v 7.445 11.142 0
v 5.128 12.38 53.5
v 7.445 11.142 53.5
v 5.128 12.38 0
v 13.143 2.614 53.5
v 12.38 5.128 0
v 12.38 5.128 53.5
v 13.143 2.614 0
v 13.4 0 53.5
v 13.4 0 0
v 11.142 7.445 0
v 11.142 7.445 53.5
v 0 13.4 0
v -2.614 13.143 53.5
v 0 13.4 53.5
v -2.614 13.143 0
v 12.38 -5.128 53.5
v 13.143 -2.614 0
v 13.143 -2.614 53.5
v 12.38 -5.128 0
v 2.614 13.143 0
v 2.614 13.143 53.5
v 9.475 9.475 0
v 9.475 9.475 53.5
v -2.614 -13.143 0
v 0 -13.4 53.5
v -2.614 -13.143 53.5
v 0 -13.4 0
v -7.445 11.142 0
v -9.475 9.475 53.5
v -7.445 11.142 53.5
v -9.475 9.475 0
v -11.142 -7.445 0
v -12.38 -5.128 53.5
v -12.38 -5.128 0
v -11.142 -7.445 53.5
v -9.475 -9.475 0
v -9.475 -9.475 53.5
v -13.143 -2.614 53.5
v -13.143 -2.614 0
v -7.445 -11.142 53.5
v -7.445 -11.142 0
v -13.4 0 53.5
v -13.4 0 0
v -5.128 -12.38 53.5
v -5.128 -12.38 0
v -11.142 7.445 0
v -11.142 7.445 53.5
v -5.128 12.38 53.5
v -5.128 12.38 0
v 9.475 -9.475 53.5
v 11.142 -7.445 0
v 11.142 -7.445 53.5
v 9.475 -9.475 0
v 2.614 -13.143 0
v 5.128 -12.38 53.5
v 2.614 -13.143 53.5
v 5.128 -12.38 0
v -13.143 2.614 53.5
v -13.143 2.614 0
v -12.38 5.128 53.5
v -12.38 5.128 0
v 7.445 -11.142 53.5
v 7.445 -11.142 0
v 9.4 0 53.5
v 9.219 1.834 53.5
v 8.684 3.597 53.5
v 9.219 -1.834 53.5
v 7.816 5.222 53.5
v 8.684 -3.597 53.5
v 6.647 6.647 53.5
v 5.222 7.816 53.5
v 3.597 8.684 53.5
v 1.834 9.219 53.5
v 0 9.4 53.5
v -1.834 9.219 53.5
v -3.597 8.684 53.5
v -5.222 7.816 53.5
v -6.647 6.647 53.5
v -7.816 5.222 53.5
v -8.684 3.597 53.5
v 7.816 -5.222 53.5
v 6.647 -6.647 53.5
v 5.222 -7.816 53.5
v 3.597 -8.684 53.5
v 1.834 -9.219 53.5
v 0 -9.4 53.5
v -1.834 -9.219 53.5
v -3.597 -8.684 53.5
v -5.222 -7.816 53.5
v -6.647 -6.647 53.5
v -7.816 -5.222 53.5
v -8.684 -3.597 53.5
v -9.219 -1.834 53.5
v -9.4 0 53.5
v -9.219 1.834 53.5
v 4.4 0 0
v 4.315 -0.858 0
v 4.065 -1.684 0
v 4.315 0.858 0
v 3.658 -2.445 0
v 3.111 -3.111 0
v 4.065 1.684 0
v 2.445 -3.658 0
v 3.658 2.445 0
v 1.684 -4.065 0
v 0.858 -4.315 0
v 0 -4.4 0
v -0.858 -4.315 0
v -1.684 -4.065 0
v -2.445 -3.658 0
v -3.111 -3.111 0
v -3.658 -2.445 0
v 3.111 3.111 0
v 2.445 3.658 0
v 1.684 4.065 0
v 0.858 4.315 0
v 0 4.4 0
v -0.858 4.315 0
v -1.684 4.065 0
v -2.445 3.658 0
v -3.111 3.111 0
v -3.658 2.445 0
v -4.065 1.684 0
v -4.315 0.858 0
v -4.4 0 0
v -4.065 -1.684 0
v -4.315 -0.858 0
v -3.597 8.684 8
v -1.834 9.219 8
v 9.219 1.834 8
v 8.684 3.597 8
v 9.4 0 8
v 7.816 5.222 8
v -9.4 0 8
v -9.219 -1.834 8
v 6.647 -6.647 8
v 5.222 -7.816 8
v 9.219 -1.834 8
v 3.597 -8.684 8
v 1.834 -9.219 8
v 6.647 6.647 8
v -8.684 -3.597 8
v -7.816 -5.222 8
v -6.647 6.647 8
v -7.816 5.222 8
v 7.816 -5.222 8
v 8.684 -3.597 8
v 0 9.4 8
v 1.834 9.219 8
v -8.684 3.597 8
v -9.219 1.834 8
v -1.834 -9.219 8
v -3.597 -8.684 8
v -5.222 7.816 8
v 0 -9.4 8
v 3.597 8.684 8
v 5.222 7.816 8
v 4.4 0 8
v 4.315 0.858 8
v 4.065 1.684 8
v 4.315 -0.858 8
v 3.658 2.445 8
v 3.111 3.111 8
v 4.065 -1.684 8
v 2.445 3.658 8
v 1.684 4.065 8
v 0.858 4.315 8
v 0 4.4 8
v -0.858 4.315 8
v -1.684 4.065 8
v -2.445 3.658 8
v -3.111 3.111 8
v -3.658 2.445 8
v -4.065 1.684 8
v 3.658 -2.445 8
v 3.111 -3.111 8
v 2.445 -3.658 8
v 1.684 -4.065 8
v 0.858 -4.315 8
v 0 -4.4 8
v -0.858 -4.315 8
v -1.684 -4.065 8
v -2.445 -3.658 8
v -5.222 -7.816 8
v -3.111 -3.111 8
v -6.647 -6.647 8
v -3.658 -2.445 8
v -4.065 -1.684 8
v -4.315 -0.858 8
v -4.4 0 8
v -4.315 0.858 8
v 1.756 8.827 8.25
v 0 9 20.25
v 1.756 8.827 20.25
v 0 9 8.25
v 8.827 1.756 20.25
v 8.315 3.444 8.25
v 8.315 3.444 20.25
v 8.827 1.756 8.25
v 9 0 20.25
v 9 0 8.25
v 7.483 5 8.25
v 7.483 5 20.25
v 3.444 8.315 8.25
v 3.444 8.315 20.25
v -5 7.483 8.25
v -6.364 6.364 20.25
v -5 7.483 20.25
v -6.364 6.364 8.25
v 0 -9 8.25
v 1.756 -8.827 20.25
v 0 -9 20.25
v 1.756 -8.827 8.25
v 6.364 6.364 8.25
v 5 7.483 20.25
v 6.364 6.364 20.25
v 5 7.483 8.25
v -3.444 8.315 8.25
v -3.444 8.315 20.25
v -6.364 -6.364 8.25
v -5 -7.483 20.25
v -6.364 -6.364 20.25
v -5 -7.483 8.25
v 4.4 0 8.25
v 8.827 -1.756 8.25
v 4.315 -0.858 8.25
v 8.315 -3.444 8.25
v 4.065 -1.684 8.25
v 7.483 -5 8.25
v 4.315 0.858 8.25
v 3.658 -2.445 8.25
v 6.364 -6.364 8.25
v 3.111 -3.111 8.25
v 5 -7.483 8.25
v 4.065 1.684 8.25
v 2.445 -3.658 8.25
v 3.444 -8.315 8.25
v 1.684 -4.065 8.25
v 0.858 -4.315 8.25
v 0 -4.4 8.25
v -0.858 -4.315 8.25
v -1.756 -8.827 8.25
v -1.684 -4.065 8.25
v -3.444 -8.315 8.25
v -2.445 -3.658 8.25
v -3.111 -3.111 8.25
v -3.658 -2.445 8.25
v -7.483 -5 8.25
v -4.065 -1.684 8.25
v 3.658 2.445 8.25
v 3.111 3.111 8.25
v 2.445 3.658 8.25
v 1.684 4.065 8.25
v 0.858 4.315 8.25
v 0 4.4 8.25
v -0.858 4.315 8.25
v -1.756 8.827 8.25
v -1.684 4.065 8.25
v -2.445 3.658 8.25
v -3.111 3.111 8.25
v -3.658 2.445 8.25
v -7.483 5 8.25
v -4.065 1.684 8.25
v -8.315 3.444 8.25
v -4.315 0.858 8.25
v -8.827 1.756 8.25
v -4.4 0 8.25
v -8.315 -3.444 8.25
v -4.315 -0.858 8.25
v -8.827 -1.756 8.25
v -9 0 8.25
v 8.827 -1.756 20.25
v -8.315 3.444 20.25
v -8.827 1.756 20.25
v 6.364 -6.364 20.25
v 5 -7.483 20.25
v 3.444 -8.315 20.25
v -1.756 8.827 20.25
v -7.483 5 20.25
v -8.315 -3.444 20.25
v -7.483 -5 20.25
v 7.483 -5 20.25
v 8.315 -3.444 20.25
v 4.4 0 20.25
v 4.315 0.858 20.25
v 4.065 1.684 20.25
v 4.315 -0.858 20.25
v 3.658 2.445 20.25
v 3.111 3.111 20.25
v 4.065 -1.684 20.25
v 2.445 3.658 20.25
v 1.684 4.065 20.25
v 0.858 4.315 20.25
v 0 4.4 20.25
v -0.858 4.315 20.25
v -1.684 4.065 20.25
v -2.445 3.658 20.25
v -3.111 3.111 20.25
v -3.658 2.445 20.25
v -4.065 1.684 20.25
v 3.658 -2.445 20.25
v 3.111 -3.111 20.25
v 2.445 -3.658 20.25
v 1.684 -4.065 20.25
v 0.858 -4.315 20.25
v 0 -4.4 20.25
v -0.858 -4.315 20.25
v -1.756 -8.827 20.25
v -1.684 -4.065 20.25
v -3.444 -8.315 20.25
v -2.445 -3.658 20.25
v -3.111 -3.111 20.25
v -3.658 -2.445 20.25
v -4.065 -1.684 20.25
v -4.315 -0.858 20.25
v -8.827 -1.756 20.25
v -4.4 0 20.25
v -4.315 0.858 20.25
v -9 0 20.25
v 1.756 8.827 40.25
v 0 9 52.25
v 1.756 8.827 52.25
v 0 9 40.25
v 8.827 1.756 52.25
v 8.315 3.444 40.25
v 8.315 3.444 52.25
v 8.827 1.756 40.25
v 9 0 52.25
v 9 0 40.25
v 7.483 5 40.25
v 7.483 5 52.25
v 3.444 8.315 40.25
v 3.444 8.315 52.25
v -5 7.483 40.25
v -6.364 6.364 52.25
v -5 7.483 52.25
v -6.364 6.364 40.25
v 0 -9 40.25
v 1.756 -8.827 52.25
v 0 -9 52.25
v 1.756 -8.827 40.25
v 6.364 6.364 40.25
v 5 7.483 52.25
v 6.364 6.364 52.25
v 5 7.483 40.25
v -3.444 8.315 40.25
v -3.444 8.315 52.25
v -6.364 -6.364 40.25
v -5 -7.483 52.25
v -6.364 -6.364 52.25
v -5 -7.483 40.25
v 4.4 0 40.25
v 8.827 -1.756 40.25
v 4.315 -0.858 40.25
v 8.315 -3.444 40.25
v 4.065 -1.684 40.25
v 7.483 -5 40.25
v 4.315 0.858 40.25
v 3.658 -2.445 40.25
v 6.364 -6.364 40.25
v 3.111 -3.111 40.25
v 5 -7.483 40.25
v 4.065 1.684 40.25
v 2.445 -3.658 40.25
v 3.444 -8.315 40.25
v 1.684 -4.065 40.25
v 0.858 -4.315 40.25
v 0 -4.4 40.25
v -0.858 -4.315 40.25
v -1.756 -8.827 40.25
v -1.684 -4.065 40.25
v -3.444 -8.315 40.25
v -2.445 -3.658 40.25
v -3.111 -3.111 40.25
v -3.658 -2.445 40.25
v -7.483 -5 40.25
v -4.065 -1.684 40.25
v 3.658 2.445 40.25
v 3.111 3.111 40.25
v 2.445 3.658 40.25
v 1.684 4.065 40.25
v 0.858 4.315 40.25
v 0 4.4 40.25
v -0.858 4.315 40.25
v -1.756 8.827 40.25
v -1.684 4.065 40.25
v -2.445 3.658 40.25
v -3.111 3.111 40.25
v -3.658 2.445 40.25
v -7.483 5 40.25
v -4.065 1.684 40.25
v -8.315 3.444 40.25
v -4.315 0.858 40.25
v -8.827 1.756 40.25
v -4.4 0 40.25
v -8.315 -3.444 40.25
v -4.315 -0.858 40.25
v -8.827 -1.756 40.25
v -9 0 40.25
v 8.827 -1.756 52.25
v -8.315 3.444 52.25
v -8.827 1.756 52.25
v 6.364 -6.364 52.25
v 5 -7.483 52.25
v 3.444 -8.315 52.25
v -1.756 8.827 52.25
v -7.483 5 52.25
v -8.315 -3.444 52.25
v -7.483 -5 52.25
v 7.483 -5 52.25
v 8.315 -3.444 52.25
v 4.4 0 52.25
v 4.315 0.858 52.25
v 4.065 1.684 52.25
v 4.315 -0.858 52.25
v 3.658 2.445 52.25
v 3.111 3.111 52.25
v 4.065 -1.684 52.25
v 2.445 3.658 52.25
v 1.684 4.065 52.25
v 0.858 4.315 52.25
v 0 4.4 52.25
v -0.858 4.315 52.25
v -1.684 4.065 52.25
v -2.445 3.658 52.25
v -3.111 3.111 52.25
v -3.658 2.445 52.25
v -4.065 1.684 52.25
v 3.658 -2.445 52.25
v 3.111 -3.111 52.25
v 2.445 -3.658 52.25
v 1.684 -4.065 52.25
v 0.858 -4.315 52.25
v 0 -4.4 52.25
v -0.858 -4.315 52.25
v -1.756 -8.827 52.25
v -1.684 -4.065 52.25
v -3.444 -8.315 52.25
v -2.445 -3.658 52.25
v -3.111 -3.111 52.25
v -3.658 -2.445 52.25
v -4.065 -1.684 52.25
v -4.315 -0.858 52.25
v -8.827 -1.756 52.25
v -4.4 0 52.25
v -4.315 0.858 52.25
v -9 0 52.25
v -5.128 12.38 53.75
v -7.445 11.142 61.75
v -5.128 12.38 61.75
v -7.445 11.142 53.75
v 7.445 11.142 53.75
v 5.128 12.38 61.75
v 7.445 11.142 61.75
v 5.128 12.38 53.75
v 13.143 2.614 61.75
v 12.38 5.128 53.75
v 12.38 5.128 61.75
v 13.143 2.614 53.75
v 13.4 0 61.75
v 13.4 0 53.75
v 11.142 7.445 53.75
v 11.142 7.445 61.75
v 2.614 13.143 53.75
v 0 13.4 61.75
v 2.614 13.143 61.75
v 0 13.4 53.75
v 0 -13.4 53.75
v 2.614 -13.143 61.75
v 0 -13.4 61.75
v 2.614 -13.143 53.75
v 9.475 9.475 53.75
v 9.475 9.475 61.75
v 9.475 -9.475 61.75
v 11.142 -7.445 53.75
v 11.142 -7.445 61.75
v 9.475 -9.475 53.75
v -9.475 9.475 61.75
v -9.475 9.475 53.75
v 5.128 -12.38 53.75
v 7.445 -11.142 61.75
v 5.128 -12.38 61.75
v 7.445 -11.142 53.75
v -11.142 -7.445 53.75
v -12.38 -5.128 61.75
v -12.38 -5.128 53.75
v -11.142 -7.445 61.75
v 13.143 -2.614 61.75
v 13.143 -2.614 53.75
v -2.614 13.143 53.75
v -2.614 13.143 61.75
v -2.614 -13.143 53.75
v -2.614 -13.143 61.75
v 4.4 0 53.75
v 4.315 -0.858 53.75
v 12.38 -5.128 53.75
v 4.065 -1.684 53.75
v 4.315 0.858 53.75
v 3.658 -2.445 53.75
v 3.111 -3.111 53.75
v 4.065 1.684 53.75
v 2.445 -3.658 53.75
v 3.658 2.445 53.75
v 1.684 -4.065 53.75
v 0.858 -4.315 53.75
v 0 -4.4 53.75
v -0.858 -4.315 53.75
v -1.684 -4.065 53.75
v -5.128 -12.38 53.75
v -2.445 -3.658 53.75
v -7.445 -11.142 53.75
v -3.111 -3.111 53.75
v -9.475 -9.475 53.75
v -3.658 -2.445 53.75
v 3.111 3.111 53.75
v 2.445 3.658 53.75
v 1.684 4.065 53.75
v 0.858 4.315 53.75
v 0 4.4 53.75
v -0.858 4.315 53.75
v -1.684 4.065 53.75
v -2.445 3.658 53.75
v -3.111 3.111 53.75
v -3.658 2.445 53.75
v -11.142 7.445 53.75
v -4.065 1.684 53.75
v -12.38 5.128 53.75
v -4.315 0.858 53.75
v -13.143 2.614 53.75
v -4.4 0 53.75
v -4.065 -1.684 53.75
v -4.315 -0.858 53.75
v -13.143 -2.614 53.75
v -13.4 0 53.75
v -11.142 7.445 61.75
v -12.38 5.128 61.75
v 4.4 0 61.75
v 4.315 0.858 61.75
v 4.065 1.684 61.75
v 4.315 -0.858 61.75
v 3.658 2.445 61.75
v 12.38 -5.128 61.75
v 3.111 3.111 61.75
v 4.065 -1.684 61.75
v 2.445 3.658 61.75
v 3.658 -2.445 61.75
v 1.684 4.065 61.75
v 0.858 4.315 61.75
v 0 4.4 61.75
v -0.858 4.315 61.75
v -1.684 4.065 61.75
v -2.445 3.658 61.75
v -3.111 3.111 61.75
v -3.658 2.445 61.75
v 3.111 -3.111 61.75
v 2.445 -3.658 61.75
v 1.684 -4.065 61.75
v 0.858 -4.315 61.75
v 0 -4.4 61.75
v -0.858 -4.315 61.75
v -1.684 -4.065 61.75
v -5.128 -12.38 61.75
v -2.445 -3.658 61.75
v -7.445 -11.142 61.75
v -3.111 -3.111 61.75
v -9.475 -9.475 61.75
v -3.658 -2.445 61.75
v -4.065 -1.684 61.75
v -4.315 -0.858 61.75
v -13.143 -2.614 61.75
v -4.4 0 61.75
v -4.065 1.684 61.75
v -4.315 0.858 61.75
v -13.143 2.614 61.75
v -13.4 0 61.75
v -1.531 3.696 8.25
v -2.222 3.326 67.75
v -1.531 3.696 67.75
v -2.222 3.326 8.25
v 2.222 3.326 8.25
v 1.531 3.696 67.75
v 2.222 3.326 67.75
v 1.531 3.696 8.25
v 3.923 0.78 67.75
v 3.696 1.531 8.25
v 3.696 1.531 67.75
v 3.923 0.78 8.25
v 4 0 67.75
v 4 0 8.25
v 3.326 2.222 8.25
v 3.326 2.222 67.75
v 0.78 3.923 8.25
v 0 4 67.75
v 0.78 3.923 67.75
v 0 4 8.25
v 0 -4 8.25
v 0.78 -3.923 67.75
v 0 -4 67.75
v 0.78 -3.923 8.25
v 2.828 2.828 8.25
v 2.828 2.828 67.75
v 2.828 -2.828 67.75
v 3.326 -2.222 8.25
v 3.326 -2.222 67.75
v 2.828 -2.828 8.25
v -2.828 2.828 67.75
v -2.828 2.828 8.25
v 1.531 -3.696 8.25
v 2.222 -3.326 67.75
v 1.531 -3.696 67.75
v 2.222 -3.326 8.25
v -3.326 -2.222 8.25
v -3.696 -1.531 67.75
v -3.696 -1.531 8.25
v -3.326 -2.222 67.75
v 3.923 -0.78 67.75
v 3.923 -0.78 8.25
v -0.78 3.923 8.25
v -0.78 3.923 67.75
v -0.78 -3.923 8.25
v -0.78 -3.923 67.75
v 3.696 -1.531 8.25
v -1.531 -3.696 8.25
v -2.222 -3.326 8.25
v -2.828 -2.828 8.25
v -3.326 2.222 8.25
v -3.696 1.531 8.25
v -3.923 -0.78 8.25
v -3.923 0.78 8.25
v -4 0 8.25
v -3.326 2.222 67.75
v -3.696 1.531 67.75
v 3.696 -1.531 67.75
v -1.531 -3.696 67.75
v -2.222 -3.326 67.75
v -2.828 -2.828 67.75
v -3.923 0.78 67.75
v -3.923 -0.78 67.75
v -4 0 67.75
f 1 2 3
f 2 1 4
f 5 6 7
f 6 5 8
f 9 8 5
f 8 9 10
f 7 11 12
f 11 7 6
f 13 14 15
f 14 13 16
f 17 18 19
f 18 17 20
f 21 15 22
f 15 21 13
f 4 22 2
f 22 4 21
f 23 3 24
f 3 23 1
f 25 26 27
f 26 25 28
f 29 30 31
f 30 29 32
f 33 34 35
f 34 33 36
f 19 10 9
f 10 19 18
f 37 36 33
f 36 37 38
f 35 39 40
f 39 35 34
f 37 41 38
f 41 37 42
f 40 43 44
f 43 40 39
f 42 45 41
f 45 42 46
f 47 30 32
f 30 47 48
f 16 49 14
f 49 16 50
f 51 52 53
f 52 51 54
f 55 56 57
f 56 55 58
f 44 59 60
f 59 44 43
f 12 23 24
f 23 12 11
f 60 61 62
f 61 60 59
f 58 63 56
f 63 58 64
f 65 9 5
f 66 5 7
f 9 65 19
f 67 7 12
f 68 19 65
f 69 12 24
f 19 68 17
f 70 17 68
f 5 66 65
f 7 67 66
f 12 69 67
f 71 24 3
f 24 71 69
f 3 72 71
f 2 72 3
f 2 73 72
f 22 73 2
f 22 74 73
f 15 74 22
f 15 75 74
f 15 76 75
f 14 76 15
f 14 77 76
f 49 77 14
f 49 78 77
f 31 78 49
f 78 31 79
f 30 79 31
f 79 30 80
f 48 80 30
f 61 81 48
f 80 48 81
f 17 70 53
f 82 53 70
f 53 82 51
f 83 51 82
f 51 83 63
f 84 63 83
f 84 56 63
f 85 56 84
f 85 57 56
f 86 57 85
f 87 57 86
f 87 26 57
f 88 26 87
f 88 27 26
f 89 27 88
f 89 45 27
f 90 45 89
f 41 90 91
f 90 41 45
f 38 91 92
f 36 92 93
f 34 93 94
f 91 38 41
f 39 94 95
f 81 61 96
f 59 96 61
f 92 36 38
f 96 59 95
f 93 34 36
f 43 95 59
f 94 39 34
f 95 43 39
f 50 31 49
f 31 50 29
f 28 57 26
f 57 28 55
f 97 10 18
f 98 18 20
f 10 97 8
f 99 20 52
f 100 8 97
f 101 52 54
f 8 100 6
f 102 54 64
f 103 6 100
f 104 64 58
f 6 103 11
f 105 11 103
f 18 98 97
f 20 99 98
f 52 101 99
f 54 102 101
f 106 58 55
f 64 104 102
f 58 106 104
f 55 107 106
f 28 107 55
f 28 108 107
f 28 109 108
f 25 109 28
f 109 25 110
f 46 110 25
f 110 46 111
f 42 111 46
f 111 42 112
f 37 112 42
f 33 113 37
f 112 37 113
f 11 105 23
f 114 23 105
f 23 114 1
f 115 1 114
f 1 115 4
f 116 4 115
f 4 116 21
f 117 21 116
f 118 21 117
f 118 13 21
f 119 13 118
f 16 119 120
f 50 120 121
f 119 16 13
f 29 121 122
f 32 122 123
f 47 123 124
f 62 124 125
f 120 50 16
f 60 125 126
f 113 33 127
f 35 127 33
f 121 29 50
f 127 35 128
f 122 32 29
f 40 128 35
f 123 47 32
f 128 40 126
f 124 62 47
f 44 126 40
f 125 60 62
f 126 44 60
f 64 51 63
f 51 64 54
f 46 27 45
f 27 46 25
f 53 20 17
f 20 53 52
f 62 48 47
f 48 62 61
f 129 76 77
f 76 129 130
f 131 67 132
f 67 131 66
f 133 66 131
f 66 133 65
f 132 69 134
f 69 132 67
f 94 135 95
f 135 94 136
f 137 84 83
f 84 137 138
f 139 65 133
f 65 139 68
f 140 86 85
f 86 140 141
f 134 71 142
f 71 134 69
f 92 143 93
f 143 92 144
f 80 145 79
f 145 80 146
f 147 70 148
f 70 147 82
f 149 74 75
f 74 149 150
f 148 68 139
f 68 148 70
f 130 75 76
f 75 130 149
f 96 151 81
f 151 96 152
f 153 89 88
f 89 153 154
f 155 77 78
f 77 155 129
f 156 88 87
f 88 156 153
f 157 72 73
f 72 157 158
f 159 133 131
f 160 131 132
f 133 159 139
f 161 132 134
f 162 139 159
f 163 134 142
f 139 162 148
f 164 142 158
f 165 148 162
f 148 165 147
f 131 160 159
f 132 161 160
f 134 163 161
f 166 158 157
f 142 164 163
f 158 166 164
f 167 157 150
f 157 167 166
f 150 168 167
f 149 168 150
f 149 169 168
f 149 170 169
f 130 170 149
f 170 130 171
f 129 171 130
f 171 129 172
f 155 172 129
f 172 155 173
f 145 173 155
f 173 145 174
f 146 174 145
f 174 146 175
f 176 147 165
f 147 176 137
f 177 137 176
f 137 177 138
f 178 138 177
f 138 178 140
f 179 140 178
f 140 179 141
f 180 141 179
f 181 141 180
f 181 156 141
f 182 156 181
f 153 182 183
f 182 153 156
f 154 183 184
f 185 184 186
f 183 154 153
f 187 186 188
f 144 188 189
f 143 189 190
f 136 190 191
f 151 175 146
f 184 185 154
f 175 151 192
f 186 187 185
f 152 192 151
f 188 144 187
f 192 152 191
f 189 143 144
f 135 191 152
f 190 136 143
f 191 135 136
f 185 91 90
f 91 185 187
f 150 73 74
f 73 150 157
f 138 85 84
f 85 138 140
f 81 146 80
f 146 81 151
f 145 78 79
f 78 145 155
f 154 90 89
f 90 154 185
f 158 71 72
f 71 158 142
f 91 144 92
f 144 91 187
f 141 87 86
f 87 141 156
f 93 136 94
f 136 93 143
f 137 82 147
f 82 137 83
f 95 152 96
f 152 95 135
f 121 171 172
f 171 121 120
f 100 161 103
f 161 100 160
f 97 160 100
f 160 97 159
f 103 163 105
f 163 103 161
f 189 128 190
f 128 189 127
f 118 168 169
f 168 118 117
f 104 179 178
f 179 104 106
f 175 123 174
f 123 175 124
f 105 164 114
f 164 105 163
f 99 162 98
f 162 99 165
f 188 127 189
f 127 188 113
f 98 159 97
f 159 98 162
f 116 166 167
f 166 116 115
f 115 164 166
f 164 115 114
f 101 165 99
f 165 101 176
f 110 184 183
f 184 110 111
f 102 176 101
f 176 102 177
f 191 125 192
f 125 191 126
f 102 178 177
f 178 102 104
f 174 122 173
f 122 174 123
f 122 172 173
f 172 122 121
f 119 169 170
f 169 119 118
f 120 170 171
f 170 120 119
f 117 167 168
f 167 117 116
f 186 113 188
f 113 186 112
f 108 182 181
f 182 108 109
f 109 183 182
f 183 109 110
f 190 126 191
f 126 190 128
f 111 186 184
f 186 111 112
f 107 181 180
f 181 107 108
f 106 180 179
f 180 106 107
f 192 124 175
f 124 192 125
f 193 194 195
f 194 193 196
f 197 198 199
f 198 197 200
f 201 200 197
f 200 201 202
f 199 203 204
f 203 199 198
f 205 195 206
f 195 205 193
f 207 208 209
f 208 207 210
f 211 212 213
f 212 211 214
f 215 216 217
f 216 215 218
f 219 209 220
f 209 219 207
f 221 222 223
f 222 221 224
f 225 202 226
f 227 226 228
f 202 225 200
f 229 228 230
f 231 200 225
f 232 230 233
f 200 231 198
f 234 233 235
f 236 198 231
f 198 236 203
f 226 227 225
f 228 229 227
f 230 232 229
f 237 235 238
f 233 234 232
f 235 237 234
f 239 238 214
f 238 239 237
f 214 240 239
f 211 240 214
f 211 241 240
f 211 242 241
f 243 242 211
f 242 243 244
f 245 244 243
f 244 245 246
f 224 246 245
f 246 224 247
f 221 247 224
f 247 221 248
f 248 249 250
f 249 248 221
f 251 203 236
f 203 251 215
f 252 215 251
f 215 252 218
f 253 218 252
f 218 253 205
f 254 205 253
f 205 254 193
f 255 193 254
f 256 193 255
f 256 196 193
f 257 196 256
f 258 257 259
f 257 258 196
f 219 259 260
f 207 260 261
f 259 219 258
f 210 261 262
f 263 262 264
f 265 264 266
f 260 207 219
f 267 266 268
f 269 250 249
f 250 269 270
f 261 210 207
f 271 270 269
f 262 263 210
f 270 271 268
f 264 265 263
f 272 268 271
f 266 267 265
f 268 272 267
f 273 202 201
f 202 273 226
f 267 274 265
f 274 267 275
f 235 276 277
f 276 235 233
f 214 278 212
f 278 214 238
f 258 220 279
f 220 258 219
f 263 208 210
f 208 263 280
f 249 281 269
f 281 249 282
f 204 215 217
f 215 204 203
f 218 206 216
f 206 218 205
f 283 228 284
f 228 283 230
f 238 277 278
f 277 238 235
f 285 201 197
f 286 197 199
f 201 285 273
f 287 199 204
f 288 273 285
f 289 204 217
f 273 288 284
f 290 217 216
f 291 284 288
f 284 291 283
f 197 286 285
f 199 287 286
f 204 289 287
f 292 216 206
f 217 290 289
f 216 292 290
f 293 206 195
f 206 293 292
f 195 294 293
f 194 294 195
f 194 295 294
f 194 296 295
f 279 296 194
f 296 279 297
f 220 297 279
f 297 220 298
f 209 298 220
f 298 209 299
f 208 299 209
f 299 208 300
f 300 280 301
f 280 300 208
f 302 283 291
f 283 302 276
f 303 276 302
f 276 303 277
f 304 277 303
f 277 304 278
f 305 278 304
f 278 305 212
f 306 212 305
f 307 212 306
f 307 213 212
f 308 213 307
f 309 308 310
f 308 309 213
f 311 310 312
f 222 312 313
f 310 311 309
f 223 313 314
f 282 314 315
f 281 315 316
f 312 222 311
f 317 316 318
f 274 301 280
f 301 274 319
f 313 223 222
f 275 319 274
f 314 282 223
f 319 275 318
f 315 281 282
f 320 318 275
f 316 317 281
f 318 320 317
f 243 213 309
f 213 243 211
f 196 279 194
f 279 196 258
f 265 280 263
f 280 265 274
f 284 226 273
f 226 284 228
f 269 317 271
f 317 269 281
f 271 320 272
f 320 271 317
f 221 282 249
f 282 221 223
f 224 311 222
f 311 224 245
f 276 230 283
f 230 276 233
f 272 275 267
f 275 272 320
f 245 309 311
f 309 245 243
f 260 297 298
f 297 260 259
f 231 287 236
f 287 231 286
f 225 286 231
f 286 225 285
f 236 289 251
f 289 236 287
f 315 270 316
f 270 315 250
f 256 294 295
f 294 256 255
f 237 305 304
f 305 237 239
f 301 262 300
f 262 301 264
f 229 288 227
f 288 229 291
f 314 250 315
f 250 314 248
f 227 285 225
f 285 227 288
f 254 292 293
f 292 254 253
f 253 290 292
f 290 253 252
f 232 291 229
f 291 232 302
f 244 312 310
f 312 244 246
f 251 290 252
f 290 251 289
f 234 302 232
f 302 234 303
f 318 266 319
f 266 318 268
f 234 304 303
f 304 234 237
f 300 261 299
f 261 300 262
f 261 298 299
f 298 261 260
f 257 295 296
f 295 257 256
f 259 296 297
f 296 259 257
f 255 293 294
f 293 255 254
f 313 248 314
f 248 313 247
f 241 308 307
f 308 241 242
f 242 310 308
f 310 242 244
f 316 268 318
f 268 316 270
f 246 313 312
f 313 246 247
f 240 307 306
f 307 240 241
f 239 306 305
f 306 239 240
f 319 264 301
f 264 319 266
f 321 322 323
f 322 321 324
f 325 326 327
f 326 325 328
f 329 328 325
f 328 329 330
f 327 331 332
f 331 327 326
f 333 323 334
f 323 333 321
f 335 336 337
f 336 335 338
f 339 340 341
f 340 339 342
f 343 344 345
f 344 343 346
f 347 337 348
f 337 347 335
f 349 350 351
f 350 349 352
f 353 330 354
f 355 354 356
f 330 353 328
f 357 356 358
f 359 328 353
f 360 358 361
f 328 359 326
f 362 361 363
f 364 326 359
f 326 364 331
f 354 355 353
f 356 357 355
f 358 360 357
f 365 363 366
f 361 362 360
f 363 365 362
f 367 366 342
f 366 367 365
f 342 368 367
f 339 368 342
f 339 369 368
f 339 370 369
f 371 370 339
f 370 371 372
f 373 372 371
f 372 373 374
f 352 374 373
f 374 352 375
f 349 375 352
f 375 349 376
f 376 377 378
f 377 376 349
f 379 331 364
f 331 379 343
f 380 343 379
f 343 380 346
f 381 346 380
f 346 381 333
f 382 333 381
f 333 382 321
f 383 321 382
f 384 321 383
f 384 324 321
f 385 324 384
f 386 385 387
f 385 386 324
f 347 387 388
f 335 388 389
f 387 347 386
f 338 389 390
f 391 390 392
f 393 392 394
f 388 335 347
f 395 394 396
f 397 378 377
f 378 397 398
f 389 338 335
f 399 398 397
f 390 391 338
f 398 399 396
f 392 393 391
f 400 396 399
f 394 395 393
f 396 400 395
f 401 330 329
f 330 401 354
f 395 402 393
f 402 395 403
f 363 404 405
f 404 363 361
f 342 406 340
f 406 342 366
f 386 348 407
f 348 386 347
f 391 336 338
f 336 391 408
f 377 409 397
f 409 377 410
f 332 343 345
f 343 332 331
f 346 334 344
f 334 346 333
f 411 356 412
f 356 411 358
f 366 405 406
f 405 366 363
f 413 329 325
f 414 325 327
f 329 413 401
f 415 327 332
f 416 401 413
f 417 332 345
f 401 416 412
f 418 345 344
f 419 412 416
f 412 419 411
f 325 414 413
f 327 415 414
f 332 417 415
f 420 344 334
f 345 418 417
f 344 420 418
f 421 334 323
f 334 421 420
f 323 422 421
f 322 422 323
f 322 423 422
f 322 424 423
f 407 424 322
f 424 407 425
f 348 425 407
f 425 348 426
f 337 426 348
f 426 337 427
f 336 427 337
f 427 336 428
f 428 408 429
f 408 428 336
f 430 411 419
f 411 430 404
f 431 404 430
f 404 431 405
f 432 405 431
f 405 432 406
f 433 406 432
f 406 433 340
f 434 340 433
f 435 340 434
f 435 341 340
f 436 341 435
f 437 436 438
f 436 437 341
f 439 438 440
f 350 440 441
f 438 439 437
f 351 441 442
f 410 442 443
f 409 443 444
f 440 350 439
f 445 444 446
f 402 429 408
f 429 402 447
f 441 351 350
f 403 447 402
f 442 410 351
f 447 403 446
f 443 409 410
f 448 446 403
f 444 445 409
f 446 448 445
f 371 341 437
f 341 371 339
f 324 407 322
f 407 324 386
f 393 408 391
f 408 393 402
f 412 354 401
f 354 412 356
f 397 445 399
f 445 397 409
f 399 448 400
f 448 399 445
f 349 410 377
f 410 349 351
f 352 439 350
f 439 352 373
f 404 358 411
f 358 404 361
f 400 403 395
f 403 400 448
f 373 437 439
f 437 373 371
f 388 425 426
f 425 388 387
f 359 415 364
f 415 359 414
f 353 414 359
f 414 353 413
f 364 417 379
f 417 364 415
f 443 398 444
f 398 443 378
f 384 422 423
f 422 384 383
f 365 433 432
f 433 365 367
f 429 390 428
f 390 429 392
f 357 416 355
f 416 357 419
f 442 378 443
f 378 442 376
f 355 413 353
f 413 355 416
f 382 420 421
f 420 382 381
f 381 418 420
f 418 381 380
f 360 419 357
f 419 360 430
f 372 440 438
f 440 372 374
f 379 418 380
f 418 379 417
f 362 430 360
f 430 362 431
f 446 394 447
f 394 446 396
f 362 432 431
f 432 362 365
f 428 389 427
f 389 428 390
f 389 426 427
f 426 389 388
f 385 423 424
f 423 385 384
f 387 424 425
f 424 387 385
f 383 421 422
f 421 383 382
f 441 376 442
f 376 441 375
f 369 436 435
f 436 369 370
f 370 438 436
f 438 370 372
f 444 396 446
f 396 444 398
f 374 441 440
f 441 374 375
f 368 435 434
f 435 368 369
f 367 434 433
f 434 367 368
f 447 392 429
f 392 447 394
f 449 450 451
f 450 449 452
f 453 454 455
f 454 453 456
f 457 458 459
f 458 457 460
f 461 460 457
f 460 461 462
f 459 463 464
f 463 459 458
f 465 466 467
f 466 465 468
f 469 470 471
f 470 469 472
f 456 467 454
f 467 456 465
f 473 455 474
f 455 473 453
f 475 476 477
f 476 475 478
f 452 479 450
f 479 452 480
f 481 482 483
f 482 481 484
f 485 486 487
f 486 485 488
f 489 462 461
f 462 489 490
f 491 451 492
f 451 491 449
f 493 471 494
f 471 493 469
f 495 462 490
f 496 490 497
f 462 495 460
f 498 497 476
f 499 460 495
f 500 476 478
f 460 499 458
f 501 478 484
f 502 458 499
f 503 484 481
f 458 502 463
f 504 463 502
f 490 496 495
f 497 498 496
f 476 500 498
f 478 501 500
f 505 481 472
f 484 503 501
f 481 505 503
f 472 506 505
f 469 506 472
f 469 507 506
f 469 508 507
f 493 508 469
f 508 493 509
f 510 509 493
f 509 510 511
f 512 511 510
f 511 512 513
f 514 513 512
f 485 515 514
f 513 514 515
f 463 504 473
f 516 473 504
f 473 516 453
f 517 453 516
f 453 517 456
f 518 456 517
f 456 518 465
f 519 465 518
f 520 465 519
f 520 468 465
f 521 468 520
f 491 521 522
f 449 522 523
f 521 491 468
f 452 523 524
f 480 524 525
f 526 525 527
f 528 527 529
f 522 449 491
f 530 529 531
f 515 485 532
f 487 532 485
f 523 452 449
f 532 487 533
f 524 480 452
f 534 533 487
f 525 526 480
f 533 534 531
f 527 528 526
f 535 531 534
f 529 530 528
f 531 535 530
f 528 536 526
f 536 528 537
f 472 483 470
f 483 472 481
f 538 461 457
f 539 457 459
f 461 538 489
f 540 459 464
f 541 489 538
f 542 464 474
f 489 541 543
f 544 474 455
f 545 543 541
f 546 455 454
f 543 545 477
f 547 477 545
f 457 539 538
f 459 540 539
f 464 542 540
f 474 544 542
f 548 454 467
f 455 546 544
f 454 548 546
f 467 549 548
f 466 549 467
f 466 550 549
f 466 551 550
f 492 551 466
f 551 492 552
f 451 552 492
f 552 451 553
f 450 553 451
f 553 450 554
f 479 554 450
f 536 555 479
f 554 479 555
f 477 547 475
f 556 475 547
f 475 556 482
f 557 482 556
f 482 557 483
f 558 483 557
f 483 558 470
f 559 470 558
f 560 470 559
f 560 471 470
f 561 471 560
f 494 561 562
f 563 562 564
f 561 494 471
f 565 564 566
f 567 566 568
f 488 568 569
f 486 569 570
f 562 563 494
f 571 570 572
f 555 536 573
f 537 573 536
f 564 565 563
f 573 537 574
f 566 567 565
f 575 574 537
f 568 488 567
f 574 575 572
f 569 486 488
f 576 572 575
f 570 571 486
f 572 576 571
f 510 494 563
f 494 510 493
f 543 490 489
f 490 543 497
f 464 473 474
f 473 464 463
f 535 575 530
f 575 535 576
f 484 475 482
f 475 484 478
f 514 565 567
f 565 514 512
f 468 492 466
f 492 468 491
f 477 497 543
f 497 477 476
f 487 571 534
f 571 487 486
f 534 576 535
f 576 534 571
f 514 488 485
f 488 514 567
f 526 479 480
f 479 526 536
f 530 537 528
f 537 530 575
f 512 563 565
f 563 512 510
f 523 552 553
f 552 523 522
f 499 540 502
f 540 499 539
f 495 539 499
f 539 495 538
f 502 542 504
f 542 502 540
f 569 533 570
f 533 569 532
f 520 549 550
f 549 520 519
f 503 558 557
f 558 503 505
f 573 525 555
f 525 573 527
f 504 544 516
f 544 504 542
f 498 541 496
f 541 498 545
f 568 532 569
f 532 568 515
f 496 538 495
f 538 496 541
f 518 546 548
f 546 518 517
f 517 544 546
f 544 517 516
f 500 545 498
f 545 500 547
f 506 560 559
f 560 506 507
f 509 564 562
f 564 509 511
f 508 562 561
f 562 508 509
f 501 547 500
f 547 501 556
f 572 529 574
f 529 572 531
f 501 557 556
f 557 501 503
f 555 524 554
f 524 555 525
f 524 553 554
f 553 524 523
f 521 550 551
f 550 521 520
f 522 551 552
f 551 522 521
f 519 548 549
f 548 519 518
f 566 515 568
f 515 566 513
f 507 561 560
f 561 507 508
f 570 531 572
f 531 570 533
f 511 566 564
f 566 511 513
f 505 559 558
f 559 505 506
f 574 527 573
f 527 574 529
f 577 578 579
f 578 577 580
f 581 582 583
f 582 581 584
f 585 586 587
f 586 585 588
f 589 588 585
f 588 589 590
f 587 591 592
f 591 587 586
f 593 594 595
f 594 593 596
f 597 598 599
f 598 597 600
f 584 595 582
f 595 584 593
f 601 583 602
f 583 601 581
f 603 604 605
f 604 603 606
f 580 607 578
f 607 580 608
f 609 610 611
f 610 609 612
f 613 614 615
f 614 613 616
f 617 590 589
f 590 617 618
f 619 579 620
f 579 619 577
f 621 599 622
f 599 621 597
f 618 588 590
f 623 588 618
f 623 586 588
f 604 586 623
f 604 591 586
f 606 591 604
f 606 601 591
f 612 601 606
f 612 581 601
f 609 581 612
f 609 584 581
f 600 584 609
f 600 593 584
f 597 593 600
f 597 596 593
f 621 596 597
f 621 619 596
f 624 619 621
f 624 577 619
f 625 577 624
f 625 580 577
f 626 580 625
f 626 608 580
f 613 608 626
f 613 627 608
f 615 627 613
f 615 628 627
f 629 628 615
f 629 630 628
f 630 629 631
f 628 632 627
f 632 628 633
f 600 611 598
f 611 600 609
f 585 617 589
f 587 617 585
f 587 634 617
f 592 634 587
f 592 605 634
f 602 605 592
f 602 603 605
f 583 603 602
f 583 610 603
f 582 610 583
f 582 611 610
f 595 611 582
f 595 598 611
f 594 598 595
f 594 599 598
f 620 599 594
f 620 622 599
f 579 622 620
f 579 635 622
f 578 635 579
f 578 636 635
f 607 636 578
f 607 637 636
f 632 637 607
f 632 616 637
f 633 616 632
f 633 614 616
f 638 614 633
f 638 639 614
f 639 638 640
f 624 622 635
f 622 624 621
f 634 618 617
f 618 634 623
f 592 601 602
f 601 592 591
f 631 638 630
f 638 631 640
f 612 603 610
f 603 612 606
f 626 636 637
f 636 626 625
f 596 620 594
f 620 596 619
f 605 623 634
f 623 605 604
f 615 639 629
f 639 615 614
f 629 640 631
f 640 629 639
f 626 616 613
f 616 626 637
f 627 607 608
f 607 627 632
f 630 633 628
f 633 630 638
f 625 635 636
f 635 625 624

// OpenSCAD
$fn = 32;

// ------------------------------------------------------------------------
// Shaft station: cup d26.8 x 53.5 mm, shaft d8
// Every part is its own module, assembly() places every instance.
// ------------------------------------------------------------------------

// --- part 1 ---
module housing_cup() {
  difference() {
    cylinder(h = 53.5, d = 26.8);
    translate([0, 0, 8]) cylinder(h = 46.5, d = 18.8);
    translate([0, 0, -1]) cylinder(h = 10, d = 8.8);
  }
}

// --- part 2 ---
module bearing_lower() {
  difference() {
      translate([0, 0, 0]) cylinder(h = 12, d = 18);
      translate([0, 0, -1]) cylinder(h = 14, d = 8.8);
    }
}

// --- part 3 ---
module bearing_upper() {
  difference() {
      translate([0, 0, 0]) cylinder(h = 12, d = 18);
      translate([0, 0, -1]) cylinder(h = 14, d = 8.8);
    }
}

// --- part 4 ---
module station_shaft() {
  translate([0, 0, -29.75]) cylinder(h = 59.5, d = 8);
}

// --- part 5 ---
module station_cover() {
  difference() {
    cylinder(h = 8, d = 26.8);
    translate([0, 0, -1]) cylinder(h = 10, d = 8.8);
  }
}

// --- assembly ---
module assembly() {
  color([0.80, 0.24, 0.20]) translate([0, 0, 0]) rotate([0, 0, 0]) housing_cup();
  color([0.20, 0.45, 0.75]) translate([0, 0, 8.25]) rotate([0, 0, 0]) bearing_lower();
  color([0.25, 0.62, 0.32]) translate([0, 0, 40.25]) rotate([0, 0, 0]) bearing_upper();
  color([0.92, 0.70, 0.18]) translate([0, 0, 38]) rotate([0, 0, 0]) station_shaft();
  color([0.58, 0.35, 0.70]) translate([0, 0, 53.75]) rotate([0, 0, 0]) station_cover();
}

assembly();
